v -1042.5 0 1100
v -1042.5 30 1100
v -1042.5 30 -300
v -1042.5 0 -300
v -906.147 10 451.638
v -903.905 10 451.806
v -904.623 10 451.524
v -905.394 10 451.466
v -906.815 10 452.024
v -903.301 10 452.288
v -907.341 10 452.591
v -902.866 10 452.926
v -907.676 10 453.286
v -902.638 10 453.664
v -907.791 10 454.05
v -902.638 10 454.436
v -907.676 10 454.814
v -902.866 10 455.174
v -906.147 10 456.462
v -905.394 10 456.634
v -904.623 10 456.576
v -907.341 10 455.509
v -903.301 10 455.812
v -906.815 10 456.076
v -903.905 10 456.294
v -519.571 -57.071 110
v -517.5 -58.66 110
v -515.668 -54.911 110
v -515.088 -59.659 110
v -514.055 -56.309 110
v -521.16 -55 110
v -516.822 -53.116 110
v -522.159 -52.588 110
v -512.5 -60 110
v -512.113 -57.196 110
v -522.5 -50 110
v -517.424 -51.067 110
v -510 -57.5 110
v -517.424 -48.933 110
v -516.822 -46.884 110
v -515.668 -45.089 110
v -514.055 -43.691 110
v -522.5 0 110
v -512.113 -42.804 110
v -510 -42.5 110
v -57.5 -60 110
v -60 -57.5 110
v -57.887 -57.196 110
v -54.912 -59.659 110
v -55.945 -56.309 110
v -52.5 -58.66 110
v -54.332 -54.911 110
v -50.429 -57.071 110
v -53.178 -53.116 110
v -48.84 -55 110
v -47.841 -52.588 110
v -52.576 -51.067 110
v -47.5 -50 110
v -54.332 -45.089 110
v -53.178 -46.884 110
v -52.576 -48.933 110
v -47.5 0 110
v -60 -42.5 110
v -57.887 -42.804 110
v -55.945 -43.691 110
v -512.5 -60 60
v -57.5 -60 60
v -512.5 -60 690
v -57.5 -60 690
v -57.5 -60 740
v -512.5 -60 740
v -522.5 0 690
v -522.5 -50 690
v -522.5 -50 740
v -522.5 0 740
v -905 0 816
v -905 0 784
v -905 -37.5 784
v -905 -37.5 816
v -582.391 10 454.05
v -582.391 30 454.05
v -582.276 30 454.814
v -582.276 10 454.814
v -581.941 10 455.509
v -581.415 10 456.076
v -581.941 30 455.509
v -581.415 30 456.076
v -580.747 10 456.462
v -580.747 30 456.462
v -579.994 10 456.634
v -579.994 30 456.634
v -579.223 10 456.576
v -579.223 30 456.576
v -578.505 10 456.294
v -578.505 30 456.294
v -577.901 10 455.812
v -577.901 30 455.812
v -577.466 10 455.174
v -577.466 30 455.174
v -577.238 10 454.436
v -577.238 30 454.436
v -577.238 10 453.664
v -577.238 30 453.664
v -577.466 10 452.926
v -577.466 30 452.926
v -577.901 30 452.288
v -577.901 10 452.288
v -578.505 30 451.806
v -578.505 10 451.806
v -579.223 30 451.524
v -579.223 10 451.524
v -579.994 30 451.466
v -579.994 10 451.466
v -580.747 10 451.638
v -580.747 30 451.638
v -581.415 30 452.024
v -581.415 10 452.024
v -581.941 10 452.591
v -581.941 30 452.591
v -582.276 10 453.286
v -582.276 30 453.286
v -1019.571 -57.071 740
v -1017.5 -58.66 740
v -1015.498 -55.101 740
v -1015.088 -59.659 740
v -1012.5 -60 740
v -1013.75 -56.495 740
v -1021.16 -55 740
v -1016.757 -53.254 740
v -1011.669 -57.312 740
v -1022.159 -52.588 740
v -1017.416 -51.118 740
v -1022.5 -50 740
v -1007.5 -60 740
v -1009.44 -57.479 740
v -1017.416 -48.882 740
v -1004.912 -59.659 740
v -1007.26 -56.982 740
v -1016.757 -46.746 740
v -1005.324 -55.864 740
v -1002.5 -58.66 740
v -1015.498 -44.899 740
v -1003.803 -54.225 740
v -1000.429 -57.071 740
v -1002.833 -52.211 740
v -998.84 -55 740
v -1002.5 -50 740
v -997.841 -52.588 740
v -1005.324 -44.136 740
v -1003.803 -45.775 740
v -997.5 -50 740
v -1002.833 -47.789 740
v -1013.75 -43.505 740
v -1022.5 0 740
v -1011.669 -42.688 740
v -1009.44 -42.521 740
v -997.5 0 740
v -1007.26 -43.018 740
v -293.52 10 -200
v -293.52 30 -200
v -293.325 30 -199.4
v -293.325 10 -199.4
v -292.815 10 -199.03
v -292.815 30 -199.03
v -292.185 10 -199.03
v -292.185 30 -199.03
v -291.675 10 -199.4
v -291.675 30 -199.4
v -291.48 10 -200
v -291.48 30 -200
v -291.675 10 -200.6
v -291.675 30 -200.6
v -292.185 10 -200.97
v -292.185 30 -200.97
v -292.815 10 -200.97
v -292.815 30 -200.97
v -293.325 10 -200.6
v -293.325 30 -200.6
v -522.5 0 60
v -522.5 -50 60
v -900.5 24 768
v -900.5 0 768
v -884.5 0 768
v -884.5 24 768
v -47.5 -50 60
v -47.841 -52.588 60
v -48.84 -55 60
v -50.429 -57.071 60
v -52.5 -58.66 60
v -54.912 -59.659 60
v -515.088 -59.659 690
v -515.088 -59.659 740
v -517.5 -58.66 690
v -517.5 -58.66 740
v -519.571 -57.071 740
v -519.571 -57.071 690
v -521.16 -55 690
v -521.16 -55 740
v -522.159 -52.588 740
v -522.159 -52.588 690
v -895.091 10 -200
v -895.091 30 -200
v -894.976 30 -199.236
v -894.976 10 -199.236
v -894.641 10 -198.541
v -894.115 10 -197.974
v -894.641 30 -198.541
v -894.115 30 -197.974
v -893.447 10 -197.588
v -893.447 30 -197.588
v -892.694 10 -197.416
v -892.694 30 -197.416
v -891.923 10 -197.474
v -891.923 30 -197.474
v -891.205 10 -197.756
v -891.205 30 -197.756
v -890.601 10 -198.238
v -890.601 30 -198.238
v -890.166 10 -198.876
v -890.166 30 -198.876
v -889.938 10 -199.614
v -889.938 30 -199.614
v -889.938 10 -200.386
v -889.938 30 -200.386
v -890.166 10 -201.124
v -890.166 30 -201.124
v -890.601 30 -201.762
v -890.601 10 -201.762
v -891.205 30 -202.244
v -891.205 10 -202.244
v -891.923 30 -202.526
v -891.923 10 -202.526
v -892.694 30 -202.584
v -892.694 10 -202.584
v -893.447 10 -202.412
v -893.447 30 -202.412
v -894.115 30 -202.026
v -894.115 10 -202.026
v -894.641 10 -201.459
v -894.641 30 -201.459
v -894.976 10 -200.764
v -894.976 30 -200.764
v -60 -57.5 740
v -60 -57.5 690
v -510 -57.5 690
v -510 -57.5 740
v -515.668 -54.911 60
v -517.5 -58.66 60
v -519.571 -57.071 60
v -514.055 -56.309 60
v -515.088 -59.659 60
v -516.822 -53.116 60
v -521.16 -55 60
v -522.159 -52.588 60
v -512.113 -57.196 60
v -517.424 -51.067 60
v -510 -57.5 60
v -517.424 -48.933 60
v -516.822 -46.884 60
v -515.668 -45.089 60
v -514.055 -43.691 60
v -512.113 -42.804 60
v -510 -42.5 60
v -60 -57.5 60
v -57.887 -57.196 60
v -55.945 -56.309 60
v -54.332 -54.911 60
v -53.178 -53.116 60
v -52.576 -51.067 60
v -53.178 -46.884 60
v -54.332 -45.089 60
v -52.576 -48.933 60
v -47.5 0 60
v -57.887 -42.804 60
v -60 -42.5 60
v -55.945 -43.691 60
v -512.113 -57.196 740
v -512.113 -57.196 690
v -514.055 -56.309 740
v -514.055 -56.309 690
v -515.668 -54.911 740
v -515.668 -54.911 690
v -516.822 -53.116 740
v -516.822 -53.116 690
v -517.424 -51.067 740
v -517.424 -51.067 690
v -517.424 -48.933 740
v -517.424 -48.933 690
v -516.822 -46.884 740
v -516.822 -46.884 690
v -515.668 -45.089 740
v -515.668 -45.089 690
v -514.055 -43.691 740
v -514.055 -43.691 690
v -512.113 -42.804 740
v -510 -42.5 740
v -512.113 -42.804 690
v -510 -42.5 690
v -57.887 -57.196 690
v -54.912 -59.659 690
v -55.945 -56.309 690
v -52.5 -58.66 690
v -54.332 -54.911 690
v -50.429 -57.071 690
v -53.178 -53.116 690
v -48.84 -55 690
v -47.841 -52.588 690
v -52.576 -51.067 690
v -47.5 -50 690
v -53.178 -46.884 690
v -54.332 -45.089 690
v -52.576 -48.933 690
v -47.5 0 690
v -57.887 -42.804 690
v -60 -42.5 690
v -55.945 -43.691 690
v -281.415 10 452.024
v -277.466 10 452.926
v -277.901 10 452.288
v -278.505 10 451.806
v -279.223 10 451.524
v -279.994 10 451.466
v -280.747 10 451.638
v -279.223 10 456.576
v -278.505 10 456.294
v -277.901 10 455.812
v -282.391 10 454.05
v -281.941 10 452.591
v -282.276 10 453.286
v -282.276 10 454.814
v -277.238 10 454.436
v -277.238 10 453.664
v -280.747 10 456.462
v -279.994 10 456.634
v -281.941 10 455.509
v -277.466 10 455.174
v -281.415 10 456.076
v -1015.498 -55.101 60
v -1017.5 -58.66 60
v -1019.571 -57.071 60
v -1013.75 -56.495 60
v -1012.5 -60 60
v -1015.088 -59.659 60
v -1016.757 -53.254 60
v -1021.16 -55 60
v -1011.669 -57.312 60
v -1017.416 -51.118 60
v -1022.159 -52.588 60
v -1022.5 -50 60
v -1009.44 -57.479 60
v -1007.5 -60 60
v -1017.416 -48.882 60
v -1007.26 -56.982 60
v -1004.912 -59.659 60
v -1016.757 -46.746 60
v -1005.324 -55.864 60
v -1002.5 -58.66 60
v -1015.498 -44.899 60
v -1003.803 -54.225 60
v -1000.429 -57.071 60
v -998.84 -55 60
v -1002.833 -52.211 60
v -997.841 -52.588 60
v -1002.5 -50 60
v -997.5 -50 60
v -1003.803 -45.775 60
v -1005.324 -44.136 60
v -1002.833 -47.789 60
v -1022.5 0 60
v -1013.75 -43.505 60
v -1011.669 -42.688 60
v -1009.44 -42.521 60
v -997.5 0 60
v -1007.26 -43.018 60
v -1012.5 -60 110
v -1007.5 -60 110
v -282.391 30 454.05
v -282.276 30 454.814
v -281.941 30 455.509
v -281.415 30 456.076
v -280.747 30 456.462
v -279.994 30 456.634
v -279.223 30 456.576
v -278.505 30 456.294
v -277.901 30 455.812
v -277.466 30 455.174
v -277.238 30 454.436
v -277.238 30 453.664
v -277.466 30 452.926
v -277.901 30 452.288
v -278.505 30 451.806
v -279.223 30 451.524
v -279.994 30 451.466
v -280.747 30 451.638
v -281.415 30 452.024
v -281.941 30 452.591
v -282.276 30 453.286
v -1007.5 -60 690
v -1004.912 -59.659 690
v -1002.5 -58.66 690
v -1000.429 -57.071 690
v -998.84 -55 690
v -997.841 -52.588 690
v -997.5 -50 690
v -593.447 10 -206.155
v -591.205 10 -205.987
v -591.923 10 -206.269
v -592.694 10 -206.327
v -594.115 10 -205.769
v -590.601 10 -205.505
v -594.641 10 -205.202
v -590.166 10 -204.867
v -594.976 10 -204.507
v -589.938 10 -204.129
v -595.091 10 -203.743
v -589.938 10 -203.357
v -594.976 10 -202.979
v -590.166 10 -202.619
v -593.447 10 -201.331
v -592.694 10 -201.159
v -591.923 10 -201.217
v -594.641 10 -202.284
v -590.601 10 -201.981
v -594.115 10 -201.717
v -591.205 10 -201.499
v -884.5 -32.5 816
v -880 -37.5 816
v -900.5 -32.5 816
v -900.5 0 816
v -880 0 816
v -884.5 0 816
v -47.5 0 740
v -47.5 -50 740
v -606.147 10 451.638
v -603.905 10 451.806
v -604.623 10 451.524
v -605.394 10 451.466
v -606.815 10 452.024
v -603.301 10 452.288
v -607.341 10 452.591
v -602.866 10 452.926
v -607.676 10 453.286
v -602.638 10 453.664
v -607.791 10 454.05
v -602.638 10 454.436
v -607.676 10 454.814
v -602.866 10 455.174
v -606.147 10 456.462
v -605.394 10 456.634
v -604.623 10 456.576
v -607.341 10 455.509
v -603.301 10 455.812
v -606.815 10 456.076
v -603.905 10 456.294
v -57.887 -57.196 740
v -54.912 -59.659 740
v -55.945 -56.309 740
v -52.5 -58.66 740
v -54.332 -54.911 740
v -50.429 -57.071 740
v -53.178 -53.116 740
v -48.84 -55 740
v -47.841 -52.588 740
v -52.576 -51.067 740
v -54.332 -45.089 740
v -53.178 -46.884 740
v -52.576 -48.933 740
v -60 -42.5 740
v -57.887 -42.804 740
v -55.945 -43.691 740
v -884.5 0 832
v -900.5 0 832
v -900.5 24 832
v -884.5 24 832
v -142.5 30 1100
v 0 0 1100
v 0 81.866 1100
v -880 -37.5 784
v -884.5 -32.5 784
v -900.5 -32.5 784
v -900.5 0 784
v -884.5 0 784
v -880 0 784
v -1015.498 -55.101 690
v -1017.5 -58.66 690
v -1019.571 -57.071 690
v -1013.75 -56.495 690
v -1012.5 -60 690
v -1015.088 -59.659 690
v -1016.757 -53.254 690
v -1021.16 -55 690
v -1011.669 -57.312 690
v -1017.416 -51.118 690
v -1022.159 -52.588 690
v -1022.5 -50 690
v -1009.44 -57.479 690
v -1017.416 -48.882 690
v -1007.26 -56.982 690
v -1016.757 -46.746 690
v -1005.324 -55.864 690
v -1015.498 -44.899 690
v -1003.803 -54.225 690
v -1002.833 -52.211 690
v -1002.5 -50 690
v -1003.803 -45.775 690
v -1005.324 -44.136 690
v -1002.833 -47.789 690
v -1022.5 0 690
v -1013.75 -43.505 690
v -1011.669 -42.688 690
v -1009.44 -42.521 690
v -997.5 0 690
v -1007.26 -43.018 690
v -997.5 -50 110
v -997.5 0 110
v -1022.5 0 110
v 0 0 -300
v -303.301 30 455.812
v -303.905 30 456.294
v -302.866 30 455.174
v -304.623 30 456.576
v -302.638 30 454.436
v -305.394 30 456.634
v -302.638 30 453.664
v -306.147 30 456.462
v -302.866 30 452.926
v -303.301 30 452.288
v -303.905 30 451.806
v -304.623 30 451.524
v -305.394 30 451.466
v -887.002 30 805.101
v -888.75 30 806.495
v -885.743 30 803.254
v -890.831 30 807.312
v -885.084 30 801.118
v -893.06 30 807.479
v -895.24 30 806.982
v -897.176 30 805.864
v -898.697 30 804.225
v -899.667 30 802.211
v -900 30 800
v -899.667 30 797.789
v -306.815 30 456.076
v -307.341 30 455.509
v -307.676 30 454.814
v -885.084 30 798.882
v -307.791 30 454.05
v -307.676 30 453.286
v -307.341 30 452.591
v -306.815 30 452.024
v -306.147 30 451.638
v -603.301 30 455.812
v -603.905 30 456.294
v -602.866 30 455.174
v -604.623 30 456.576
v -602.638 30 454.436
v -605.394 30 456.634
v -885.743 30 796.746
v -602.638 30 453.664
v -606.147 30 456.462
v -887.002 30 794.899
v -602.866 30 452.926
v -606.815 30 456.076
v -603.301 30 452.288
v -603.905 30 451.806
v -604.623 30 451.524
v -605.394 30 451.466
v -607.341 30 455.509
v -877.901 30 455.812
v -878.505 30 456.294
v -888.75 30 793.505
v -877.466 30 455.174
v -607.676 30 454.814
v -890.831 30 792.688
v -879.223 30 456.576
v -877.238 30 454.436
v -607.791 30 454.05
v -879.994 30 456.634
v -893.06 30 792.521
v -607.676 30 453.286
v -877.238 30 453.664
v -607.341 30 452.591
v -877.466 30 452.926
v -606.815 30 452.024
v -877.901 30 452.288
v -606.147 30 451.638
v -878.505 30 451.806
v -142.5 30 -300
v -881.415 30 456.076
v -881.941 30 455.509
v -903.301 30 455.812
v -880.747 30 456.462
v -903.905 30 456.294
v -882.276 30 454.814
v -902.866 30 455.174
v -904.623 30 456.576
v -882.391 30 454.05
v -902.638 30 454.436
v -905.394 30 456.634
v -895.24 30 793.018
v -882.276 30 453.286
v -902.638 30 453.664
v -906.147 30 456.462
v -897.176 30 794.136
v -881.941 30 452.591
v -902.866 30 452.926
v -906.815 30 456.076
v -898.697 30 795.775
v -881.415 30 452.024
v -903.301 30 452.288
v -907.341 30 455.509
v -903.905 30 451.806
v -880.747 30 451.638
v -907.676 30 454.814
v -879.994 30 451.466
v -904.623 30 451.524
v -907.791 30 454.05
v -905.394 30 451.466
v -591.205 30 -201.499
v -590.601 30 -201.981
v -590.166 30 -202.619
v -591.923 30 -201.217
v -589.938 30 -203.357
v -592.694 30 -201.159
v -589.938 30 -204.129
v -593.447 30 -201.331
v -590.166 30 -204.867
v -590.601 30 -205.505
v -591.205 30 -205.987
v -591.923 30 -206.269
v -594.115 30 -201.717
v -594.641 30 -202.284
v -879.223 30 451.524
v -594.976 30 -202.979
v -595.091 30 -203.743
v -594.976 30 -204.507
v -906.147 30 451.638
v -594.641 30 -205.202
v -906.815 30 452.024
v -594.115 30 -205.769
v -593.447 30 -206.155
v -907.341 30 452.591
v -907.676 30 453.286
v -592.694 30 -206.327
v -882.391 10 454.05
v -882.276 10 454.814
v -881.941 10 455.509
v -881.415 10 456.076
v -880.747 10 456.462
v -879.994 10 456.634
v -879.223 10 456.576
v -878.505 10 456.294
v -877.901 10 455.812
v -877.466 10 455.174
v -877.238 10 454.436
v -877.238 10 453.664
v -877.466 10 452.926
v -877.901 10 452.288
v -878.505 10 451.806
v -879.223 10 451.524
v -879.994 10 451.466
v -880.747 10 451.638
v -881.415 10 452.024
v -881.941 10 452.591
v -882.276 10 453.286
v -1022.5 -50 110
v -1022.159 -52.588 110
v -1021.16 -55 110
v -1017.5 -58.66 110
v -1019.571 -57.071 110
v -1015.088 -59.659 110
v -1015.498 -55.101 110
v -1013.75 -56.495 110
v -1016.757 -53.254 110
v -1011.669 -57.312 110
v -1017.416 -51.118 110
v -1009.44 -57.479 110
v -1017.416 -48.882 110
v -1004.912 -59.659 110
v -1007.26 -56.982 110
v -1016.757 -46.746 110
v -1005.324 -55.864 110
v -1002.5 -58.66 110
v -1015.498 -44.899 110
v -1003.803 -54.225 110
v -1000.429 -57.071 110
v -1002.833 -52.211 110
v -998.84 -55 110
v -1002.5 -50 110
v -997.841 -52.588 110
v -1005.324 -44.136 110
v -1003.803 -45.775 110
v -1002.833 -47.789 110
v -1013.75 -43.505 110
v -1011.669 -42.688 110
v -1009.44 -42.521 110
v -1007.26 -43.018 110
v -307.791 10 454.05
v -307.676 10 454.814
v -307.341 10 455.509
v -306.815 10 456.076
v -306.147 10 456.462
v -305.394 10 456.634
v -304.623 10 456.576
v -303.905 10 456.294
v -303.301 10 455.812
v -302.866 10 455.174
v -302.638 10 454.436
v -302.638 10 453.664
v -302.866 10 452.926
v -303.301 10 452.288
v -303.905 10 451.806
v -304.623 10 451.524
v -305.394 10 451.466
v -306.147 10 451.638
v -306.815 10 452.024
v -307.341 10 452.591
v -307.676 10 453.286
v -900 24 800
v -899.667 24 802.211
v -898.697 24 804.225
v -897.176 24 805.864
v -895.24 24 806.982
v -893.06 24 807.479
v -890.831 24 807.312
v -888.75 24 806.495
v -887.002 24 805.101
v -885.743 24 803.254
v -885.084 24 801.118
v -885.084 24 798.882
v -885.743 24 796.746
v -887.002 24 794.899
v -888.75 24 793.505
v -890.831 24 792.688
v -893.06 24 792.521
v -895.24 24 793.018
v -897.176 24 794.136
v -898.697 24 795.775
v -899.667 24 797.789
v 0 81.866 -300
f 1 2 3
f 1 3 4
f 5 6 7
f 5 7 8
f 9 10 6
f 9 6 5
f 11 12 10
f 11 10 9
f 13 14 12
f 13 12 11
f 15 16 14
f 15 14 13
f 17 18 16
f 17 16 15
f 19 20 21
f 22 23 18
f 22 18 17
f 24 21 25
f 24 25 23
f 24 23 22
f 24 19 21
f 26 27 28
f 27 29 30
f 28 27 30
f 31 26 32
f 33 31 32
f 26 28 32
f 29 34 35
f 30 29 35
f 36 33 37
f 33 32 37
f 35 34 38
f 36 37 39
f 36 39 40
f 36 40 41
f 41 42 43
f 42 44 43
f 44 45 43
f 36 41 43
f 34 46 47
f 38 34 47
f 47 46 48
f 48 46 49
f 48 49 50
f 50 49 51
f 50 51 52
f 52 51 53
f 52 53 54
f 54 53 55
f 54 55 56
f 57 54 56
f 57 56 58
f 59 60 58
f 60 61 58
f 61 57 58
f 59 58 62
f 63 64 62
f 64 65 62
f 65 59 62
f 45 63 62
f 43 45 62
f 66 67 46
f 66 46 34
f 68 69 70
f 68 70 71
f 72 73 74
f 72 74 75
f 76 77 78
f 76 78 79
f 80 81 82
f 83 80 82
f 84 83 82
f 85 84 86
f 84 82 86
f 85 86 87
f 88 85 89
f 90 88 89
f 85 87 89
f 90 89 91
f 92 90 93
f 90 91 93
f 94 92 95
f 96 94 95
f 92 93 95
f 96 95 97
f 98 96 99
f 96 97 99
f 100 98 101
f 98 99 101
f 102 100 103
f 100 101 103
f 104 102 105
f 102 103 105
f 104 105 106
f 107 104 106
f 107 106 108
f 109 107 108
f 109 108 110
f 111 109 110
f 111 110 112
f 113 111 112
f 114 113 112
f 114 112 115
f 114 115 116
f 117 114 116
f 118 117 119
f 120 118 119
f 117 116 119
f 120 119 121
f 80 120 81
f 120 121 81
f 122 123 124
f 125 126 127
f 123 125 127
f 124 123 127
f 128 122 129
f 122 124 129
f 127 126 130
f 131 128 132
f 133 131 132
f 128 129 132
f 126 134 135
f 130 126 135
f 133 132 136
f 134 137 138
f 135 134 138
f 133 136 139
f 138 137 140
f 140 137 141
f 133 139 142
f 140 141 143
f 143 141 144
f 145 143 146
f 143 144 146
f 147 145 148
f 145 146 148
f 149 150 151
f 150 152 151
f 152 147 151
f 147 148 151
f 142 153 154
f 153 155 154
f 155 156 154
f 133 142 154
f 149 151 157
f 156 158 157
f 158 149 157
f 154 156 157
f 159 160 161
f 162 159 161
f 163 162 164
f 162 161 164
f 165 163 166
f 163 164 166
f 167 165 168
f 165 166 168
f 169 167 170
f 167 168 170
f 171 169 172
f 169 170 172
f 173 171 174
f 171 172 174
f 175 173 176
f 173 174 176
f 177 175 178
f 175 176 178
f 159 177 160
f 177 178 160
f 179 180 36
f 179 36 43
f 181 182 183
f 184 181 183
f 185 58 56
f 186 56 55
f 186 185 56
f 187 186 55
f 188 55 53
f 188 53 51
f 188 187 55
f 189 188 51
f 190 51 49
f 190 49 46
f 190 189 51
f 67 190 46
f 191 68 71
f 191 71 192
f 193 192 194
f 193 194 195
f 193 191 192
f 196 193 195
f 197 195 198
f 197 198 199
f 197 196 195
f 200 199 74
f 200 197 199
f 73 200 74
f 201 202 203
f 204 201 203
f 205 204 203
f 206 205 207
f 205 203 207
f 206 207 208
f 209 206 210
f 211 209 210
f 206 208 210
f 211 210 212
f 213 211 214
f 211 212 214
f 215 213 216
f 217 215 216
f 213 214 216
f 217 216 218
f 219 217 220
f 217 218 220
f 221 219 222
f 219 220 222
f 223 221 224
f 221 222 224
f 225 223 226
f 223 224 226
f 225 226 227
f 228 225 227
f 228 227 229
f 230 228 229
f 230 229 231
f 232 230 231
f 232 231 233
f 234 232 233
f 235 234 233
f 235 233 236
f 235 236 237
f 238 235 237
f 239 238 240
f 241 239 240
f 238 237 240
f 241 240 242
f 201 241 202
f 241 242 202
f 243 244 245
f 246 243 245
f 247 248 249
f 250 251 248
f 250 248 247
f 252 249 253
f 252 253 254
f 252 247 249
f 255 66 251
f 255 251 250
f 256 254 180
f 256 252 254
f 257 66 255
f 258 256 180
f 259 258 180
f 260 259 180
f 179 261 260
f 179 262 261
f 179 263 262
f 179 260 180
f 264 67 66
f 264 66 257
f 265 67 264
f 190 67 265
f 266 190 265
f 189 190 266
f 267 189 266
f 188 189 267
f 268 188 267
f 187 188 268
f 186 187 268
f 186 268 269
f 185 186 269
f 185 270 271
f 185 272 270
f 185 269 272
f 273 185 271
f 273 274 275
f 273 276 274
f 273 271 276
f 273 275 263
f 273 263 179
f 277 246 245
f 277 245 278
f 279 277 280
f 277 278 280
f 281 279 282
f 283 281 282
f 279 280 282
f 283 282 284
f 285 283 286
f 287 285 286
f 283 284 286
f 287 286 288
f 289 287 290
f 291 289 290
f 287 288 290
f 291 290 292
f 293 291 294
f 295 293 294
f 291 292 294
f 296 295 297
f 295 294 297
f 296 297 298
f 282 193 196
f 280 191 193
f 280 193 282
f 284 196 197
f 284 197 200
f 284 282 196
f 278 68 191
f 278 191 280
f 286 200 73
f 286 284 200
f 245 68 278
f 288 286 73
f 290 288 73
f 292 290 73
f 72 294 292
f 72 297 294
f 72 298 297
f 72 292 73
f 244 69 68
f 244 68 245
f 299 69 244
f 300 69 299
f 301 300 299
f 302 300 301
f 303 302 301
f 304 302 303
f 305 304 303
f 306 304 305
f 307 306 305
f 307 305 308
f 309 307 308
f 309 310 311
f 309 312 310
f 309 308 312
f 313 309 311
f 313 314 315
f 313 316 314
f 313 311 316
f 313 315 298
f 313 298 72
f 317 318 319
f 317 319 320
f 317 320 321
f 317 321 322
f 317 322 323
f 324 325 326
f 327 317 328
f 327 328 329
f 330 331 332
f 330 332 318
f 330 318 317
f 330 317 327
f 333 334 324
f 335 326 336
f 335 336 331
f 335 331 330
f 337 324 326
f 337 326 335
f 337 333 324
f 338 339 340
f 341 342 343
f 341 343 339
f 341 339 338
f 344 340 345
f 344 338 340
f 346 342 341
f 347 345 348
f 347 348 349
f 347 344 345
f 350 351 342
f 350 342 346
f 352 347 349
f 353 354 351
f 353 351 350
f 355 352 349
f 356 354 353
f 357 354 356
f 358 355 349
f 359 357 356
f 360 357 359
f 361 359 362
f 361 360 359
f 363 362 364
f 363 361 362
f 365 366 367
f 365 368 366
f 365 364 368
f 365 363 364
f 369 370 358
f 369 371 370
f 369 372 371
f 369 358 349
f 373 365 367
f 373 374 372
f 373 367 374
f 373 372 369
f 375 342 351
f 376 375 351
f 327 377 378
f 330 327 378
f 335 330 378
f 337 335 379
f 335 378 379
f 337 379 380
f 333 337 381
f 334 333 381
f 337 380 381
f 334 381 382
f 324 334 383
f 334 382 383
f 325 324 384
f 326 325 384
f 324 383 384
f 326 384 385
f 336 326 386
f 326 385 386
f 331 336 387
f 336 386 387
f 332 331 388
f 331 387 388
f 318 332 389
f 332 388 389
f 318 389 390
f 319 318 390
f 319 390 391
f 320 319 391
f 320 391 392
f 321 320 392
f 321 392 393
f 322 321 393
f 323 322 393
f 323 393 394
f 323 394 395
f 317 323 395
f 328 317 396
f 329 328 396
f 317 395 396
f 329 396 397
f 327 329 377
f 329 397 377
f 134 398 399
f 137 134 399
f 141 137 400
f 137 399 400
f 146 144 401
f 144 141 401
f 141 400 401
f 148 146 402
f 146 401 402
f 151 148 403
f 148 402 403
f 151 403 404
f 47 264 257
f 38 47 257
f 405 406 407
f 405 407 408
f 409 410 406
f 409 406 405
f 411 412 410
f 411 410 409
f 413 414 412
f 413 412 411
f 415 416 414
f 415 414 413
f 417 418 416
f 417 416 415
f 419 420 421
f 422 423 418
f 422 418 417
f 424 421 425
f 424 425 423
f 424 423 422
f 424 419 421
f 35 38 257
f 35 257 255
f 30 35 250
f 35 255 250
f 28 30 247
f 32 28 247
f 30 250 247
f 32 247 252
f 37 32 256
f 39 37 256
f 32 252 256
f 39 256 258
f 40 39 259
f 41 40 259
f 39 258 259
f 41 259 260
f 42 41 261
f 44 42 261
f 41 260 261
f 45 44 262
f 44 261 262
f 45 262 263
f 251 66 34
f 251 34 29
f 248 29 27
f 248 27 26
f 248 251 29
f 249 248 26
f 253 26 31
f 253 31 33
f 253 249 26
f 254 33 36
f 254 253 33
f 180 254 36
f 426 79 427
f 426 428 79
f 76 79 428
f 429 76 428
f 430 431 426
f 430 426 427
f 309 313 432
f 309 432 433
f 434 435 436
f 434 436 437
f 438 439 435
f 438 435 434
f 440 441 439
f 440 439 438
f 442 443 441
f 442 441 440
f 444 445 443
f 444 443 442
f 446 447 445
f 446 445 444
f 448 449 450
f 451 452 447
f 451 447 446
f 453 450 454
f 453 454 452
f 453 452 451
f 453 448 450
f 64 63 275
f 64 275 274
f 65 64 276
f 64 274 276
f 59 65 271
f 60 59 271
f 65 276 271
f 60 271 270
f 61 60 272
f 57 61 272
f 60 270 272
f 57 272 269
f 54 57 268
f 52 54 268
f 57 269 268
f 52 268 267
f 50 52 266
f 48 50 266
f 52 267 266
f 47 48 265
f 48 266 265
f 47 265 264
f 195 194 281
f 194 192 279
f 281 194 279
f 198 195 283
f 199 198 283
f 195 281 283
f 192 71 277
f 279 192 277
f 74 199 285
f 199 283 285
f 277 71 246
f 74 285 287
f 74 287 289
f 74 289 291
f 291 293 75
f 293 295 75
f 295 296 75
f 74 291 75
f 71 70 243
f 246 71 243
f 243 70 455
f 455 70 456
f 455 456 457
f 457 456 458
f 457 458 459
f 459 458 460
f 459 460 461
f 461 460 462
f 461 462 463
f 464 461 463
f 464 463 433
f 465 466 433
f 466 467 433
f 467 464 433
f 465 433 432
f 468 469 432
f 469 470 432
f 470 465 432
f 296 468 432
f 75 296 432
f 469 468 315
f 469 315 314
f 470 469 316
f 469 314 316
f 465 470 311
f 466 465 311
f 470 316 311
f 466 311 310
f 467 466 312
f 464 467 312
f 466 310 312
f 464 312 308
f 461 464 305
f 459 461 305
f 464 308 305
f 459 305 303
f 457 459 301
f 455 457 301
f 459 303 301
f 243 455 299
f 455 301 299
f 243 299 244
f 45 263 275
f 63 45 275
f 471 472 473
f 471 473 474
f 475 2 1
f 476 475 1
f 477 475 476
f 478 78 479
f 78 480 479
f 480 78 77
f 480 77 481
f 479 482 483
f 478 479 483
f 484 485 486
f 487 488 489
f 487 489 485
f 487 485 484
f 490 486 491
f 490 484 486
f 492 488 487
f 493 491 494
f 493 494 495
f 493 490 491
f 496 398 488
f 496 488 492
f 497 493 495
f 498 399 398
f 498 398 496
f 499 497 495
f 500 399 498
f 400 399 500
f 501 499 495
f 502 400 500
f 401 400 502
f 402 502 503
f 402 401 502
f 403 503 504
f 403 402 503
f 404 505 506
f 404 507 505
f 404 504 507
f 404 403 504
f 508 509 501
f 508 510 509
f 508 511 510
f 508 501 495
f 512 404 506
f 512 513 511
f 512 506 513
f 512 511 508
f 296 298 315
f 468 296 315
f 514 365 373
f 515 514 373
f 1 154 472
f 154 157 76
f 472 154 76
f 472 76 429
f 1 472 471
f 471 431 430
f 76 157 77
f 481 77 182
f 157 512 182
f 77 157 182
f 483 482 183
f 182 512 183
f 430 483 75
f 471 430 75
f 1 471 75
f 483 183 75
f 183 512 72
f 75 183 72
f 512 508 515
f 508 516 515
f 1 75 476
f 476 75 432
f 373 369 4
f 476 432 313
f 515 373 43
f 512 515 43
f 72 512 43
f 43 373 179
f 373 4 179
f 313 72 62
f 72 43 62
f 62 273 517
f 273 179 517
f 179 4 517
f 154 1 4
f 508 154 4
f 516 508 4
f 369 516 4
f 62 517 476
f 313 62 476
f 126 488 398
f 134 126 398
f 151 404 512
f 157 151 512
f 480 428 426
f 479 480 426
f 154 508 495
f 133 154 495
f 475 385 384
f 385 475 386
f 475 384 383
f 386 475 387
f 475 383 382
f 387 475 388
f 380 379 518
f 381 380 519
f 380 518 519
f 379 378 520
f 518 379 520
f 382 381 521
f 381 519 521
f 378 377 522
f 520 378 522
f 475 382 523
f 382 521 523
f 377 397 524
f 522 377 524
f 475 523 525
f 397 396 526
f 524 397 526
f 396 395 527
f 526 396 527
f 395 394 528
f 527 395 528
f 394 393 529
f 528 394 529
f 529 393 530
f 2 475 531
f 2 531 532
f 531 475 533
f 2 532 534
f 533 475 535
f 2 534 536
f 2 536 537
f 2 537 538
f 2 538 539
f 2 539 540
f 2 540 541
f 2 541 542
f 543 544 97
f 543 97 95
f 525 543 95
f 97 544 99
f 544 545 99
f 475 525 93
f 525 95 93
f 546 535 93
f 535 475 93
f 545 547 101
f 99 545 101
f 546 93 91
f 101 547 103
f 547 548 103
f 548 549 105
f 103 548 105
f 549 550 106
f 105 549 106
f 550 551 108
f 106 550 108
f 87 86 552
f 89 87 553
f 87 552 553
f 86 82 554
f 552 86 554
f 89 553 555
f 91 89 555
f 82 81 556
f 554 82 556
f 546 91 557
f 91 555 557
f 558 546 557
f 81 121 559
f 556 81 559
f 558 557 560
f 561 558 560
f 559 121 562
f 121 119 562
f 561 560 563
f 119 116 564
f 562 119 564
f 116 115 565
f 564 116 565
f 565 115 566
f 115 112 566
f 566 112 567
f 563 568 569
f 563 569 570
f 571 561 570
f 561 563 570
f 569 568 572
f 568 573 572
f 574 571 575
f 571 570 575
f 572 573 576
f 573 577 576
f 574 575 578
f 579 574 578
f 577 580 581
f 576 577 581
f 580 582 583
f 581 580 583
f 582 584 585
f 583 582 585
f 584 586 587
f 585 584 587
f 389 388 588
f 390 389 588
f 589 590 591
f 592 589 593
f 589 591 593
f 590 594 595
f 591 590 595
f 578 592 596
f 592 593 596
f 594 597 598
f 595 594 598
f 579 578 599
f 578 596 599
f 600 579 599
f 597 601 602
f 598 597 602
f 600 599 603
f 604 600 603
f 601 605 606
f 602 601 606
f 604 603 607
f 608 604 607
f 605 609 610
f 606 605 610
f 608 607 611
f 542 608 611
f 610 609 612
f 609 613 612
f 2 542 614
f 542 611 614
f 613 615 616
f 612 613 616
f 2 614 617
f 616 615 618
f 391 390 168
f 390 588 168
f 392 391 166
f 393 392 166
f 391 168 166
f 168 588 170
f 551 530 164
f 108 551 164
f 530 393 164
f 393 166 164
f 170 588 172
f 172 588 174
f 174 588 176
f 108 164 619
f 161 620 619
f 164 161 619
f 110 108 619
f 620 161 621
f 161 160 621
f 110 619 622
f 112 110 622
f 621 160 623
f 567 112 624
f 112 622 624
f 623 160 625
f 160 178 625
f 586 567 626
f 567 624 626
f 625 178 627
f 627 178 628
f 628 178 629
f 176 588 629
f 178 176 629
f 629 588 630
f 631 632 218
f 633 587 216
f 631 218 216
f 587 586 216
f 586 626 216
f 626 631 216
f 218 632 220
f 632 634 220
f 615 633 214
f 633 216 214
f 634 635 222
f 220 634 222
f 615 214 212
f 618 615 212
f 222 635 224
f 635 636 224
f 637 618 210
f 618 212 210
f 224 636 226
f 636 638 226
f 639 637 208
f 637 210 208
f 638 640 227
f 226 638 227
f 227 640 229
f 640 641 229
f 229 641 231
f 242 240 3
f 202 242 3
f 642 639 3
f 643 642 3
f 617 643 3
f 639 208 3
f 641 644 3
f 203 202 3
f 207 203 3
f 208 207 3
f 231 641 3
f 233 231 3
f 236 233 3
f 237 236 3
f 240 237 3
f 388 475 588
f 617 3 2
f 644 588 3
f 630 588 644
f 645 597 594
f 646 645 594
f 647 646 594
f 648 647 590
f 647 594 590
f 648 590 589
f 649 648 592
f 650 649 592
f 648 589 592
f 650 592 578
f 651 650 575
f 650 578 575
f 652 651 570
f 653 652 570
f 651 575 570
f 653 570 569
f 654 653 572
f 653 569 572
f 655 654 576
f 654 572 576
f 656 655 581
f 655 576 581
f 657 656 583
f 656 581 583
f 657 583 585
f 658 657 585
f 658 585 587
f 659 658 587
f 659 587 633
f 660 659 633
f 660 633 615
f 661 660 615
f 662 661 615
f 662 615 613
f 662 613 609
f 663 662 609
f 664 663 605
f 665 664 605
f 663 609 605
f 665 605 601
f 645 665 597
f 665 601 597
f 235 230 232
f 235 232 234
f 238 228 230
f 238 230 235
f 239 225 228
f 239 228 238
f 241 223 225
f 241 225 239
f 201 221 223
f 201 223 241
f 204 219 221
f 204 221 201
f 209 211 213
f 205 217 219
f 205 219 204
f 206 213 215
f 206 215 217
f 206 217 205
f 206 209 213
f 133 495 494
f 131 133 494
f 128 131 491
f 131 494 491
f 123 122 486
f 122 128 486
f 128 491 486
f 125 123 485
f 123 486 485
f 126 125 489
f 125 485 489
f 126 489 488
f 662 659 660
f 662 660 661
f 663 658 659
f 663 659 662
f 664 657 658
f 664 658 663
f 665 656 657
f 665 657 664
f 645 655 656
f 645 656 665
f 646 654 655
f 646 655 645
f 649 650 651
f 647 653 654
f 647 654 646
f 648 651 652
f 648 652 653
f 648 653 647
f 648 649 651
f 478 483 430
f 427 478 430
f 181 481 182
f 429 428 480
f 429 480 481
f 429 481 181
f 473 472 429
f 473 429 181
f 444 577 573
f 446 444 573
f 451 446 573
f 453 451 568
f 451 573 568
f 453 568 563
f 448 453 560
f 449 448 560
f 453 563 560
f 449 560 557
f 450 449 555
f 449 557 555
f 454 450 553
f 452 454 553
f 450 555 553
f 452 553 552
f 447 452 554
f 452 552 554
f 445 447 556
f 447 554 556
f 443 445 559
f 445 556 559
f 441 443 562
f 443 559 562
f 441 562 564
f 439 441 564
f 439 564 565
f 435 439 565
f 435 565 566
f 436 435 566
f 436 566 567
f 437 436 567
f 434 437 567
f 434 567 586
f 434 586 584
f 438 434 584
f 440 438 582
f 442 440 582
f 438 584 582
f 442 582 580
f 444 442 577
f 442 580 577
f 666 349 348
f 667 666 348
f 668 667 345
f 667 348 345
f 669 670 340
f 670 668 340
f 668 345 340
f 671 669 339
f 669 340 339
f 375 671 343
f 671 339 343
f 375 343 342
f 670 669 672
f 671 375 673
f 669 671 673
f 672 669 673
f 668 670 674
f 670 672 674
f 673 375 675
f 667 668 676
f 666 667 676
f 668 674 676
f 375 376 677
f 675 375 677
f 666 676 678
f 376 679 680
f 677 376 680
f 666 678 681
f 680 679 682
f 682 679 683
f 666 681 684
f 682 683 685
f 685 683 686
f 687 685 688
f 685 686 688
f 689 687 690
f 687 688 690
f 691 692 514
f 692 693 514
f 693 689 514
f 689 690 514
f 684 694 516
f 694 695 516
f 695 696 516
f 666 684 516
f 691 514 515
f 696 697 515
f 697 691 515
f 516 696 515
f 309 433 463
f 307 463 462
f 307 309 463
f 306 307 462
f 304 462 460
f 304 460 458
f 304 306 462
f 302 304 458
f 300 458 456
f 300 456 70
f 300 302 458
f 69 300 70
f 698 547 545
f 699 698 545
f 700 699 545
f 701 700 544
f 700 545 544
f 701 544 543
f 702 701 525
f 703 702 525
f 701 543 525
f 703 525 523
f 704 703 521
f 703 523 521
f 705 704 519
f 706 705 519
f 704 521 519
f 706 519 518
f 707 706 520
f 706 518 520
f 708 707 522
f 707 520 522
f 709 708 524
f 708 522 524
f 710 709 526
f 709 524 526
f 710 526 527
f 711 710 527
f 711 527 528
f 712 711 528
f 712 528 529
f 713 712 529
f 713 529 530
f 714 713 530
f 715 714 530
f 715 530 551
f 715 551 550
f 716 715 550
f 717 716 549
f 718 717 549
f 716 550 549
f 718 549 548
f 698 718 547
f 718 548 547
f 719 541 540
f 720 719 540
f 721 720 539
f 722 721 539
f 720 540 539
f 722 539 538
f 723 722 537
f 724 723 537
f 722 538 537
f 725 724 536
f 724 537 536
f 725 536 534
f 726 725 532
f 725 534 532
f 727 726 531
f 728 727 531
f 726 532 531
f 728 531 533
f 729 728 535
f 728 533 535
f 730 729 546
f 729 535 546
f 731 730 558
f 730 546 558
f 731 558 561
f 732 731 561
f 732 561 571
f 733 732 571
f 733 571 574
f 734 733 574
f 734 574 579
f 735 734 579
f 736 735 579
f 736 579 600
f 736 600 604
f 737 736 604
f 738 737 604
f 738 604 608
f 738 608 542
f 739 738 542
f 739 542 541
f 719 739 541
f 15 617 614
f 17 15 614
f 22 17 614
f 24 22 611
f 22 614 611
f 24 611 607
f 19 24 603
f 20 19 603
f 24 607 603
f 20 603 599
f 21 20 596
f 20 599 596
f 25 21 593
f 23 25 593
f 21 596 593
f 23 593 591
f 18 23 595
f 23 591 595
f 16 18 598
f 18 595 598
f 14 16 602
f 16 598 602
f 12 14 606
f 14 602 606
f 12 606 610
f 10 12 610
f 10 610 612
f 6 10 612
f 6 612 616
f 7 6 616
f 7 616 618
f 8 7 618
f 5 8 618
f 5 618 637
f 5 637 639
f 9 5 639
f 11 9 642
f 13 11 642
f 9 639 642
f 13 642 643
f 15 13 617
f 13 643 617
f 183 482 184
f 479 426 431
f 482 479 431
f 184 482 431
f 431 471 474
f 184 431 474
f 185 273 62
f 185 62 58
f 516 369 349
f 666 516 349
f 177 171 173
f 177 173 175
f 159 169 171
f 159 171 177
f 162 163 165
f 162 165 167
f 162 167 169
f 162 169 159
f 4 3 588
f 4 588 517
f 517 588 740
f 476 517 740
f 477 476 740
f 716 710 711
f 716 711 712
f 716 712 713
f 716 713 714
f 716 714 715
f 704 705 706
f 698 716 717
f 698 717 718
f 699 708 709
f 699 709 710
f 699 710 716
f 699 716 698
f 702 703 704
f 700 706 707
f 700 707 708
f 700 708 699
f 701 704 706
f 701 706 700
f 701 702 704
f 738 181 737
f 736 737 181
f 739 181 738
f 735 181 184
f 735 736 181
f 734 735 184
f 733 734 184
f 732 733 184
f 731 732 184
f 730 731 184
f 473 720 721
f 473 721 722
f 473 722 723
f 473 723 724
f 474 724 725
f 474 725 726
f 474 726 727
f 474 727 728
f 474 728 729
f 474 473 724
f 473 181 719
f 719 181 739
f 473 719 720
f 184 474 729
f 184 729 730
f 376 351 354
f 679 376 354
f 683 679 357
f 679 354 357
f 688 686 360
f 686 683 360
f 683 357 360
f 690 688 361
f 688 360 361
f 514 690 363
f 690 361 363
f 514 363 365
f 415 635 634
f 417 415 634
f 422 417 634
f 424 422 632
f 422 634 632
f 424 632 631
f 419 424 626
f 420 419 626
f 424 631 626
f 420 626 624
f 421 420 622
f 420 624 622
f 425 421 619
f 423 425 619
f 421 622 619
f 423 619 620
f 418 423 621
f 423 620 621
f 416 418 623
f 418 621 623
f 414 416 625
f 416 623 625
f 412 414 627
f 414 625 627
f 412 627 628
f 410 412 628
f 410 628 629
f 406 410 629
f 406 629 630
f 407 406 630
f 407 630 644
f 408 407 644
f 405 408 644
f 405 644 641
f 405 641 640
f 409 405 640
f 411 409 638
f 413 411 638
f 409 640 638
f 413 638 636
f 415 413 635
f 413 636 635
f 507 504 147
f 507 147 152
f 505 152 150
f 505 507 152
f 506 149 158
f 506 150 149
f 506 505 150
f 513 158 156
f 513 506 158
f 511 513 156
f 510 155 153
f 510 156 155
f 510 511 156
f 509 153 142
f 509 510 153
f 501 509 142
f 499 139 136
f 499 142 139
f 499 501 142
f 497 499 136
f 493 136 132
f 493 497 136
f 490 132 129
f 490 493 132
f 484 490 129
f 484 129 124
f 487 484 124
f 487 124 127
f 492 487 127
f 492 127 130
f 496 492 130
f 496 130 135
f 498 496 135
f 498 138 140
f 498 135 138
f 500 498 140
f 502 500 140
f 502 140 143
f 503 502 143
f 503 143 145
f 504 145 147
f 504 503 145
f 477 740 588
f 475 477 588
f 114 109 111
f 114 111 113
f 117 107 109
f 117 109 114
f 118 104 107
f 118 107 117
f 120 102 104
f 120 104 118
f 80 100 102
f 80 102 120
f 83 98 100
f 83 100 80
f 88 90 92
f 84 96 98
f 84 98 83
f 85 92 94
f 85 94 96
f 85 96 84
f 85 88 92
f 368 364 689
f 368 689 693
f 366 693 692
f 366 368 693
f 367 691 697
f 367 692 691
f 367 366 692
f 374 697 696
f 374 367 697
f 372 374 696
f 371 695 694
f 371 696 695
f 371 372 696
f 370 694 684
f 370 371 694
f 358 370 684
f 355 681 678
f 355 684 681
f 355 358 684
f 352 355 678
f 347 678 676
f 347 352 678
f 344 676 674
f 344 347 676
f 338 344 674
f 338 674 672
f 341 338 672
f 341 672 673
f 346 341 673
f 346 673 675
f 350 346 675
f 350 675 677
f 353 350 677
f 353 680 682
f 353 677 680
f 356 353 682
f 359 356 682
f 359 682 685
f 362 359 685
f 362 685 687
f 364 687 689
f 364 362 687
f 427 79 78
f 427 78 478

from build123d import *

# Parameters (mm, degrees)
BOSS_EXTRUDE1_DEPTH      = 1100
BOSS_EXTRUDE1_DEPTH_BACK = 300
SKETCH3_R                = 7.5
BOSS_EXTRUDE2_DEPTH      = 800
SKETCH5_R                = 7.5
CUT_EXTRUDE2_DEPTH       = 1519.191769837
SKETCH9_W                = 580
SKETCH9_H                = 60
SKETCH9_W_2              = 60
CUT_EXTRUDE5_DEPTH       = 1486.505638628
SKETCH6_W                = 25
SKETCH6_H                = 32
BOSS_EXTRUDE3_DEPTH      = 37.5
SKETCH7_W                = 16
SKETCH7_H                = 32.5
CUT_EXTRUDE3_DEPTH       = 1530.367271912
SKETCH8_W                = 16
SKETCH8_H                = 64
CUT_EXTRUDE4_DEPTH       = 24
SKETCH10_R               = 2.5908
SKETCH10_R_2             = 1.02
CUT_EXTRUDE6_DEPTH       = 20


with BuildPart() as part:
    # Sketch2 → Boss-Extrude1 (new, two sides: drawn at the far end of the back side and taken through both)
    with BuildSketch(Plane.XY.offset(-BOSS_EXTRUDE1_DEPTH_BACK)):
        Polygon((0, 0), (0, 81.865758383), (-142.5, 30), (-1042.5, 30), (-1042.5, 0), align=None)
    extrude(amount=BOSS_EXTRUDE1_DEPTH + BOSS_EXTRUDE1_DEPTH_BACK)

    # Sketch3 → Boss-Extrude2 (add)
    # profile 1 of 2: a face of its own
    with BuildSketch(Plane.XY):
        with BuildLine():
            Line((-47.5, 0), (-47.5, -50))
            ThreePointArc((-47.5, -50), (-50.428932188, -57.071067812), (-57.5, -60))
            Line((-57.5, -60), (-512.5, -60))
            ThreePointArc((-512.5, -60), (-519.571067812, -57.071067812), (-522.5, -50))
            Line((-522.5, -50), (-522.5, 0))
            Line((-522.5, 0), (-47.5, 0))
        make_face()
        with BuildLine():
            Line((-510, -42.5), (-60, -42.5))
            ThreePointArc((-60, -42.5), (-52.5, -50), (-60, -57.5))
            Line((-60, -57.5), (-510, -57.5))
            ThreePointArc((-510, -57.5), (-517.5, -50), (-510, -42.5))
        make_face(mode=Mode.SUBTRACT)
    # profile 2 of 2: a face of its own
    with BuildSketch(Plane.XY):
        with BuildLine():
            Line((-1022.5, 0), (-1022.5, -50))
            ThreePointArc((-1022.5, -50), (-1019.571067812, -57.071067812), (-1012.5, -60))
            Line((-1012.5, -60), (-1007.5, -60))
            ThreePointArc((-1007.5, -60), (-1000.428932188, -57.071067812), (-997.5, -50))
            Line((-997.5, -50), (-997.5, 0))
            Line((-997.5, 0), (-1022.5, 0))
        make_face()
        with Locations((-1010, -50)):
            Circle(SKETCH3_R, mode=Mode.SUBTRACT)
    extrude(amount=BOSS_EXTRUDE2_DEPTH)

    # Sketch5 → Cut-Extrude2 (cut, through all)
    with BuildSketch(Plane(origin=(0, 30, 0), x_dir=(1, 0, 0), z_dir=(0, 1, 0))):
        with Locations(Location((-892.5, -800, 0), (0, 0, 180))):
            Circle(SKETCH5_R)
    extrude(amount=-CUT_EXTRUDE2_DEPTH, mode=Mode.SUBTRACT)

    # Sketch9 → Cut-Extrude5 (cut, through all)
    with BuildSketch(Plane(origin=(-47.5, 0, 0), x_dir=(0, 0, -1), z_dir=(1, 0, 0))):
        with Locations((-400, -30)):
            Rectangle(SKETCH9_W, SKETCH9_H)
        Polygon((-740, -50), (-740, -60), (-800, -60), (-800, -50), (-800, 0), (-740, 0), align=None)
        with Locations((-30, -30)):
            Rectangle(SKETCH9_W_2, SKETCH9_H)
    extrude(amount=-CUT_EXTRUDE5_DEPTH, mode=Mode.SUBTRACT)

    # Sketch6 → Boss-Extrude3 (add)
    with BuildSketch(Plane.XZ):
        with Locations((-892.5, 800)):
            Rectangle(SKETCH6_W, SKETCH6_H)
    extrude(amount=BOSS_EXTRUDE3_DEPTH)

    # Sketch7 → Cut-Extrude3 (cut, through all)
    with BuildSketch(Plane.XY.offset(816)):
        with Locations((-892.5, -16.25)):
            Rectangle(SKETCH7_W, SKETCH7_H)
    extrude(amount=-CUT_EXTRUDE3_DEPTH, mode=Mode.SUBTRACT)

    # Sketch8 → Cut-Extrude4 (cut)
    with BuildSketch(Plane.XZ):
        with Locations((-892.5, 800)):
            Rectangle(SKETCH8_W, SKETCH8_H)
    extrude(amount=-CUT_EXTRUDE4_DEPTH, mode=Mode.SUBTRACT)

    # Sketch10 → Cut-Extrude6 (cut)
    with BuildSketch(Plane(origin=(0, 30, 0), x_dir=(1, 0, 0), z_dir=(0, 1, 0))):
        with Locations(Location((-892.5, 200, 0), (0, 0, 180))):
            Circle(SKETCH10_R)
        with Locations(Location((-592.5, 203.742997566, 0), (0, 0, 180))):
            Circle(SKETCH10_R)
        with Locations(Location((-292.5, 200, 0), (0, 0, 180))):
            Circle(SKETCH10_R_2)
        with Locations(Location((-905.2, -454.05, 0), (0, 0, 180))):
            Circle(SKETCH10_R)
        with Locations(Location((-879.8, -454.05, 0), (0, 0, 180))):
            Circle(SKETCH10_R)
        with Locations(Location((-605.2, -454.05, 0), (0, 0, 180))):
            Circle(SKETCH10_R)
        with Locations(Location((-579.8, -454.05, 0), (0, 0, 180))):
            Circle(SKETCH10_R)
        with Locations(Location((-305.2, -454.05, 0), (0, 0, 180))):
            Circle(SKETCH10_R)
        with Locations(Location((-279.8, -454.05, 0), (0, 0, 180))):
            Circle(SKETCH10_R)
    extrude(amount=-CUT_EXTRUDE6_DEPTH, mode=Mode.SUBTRACT)


solid = part.part
